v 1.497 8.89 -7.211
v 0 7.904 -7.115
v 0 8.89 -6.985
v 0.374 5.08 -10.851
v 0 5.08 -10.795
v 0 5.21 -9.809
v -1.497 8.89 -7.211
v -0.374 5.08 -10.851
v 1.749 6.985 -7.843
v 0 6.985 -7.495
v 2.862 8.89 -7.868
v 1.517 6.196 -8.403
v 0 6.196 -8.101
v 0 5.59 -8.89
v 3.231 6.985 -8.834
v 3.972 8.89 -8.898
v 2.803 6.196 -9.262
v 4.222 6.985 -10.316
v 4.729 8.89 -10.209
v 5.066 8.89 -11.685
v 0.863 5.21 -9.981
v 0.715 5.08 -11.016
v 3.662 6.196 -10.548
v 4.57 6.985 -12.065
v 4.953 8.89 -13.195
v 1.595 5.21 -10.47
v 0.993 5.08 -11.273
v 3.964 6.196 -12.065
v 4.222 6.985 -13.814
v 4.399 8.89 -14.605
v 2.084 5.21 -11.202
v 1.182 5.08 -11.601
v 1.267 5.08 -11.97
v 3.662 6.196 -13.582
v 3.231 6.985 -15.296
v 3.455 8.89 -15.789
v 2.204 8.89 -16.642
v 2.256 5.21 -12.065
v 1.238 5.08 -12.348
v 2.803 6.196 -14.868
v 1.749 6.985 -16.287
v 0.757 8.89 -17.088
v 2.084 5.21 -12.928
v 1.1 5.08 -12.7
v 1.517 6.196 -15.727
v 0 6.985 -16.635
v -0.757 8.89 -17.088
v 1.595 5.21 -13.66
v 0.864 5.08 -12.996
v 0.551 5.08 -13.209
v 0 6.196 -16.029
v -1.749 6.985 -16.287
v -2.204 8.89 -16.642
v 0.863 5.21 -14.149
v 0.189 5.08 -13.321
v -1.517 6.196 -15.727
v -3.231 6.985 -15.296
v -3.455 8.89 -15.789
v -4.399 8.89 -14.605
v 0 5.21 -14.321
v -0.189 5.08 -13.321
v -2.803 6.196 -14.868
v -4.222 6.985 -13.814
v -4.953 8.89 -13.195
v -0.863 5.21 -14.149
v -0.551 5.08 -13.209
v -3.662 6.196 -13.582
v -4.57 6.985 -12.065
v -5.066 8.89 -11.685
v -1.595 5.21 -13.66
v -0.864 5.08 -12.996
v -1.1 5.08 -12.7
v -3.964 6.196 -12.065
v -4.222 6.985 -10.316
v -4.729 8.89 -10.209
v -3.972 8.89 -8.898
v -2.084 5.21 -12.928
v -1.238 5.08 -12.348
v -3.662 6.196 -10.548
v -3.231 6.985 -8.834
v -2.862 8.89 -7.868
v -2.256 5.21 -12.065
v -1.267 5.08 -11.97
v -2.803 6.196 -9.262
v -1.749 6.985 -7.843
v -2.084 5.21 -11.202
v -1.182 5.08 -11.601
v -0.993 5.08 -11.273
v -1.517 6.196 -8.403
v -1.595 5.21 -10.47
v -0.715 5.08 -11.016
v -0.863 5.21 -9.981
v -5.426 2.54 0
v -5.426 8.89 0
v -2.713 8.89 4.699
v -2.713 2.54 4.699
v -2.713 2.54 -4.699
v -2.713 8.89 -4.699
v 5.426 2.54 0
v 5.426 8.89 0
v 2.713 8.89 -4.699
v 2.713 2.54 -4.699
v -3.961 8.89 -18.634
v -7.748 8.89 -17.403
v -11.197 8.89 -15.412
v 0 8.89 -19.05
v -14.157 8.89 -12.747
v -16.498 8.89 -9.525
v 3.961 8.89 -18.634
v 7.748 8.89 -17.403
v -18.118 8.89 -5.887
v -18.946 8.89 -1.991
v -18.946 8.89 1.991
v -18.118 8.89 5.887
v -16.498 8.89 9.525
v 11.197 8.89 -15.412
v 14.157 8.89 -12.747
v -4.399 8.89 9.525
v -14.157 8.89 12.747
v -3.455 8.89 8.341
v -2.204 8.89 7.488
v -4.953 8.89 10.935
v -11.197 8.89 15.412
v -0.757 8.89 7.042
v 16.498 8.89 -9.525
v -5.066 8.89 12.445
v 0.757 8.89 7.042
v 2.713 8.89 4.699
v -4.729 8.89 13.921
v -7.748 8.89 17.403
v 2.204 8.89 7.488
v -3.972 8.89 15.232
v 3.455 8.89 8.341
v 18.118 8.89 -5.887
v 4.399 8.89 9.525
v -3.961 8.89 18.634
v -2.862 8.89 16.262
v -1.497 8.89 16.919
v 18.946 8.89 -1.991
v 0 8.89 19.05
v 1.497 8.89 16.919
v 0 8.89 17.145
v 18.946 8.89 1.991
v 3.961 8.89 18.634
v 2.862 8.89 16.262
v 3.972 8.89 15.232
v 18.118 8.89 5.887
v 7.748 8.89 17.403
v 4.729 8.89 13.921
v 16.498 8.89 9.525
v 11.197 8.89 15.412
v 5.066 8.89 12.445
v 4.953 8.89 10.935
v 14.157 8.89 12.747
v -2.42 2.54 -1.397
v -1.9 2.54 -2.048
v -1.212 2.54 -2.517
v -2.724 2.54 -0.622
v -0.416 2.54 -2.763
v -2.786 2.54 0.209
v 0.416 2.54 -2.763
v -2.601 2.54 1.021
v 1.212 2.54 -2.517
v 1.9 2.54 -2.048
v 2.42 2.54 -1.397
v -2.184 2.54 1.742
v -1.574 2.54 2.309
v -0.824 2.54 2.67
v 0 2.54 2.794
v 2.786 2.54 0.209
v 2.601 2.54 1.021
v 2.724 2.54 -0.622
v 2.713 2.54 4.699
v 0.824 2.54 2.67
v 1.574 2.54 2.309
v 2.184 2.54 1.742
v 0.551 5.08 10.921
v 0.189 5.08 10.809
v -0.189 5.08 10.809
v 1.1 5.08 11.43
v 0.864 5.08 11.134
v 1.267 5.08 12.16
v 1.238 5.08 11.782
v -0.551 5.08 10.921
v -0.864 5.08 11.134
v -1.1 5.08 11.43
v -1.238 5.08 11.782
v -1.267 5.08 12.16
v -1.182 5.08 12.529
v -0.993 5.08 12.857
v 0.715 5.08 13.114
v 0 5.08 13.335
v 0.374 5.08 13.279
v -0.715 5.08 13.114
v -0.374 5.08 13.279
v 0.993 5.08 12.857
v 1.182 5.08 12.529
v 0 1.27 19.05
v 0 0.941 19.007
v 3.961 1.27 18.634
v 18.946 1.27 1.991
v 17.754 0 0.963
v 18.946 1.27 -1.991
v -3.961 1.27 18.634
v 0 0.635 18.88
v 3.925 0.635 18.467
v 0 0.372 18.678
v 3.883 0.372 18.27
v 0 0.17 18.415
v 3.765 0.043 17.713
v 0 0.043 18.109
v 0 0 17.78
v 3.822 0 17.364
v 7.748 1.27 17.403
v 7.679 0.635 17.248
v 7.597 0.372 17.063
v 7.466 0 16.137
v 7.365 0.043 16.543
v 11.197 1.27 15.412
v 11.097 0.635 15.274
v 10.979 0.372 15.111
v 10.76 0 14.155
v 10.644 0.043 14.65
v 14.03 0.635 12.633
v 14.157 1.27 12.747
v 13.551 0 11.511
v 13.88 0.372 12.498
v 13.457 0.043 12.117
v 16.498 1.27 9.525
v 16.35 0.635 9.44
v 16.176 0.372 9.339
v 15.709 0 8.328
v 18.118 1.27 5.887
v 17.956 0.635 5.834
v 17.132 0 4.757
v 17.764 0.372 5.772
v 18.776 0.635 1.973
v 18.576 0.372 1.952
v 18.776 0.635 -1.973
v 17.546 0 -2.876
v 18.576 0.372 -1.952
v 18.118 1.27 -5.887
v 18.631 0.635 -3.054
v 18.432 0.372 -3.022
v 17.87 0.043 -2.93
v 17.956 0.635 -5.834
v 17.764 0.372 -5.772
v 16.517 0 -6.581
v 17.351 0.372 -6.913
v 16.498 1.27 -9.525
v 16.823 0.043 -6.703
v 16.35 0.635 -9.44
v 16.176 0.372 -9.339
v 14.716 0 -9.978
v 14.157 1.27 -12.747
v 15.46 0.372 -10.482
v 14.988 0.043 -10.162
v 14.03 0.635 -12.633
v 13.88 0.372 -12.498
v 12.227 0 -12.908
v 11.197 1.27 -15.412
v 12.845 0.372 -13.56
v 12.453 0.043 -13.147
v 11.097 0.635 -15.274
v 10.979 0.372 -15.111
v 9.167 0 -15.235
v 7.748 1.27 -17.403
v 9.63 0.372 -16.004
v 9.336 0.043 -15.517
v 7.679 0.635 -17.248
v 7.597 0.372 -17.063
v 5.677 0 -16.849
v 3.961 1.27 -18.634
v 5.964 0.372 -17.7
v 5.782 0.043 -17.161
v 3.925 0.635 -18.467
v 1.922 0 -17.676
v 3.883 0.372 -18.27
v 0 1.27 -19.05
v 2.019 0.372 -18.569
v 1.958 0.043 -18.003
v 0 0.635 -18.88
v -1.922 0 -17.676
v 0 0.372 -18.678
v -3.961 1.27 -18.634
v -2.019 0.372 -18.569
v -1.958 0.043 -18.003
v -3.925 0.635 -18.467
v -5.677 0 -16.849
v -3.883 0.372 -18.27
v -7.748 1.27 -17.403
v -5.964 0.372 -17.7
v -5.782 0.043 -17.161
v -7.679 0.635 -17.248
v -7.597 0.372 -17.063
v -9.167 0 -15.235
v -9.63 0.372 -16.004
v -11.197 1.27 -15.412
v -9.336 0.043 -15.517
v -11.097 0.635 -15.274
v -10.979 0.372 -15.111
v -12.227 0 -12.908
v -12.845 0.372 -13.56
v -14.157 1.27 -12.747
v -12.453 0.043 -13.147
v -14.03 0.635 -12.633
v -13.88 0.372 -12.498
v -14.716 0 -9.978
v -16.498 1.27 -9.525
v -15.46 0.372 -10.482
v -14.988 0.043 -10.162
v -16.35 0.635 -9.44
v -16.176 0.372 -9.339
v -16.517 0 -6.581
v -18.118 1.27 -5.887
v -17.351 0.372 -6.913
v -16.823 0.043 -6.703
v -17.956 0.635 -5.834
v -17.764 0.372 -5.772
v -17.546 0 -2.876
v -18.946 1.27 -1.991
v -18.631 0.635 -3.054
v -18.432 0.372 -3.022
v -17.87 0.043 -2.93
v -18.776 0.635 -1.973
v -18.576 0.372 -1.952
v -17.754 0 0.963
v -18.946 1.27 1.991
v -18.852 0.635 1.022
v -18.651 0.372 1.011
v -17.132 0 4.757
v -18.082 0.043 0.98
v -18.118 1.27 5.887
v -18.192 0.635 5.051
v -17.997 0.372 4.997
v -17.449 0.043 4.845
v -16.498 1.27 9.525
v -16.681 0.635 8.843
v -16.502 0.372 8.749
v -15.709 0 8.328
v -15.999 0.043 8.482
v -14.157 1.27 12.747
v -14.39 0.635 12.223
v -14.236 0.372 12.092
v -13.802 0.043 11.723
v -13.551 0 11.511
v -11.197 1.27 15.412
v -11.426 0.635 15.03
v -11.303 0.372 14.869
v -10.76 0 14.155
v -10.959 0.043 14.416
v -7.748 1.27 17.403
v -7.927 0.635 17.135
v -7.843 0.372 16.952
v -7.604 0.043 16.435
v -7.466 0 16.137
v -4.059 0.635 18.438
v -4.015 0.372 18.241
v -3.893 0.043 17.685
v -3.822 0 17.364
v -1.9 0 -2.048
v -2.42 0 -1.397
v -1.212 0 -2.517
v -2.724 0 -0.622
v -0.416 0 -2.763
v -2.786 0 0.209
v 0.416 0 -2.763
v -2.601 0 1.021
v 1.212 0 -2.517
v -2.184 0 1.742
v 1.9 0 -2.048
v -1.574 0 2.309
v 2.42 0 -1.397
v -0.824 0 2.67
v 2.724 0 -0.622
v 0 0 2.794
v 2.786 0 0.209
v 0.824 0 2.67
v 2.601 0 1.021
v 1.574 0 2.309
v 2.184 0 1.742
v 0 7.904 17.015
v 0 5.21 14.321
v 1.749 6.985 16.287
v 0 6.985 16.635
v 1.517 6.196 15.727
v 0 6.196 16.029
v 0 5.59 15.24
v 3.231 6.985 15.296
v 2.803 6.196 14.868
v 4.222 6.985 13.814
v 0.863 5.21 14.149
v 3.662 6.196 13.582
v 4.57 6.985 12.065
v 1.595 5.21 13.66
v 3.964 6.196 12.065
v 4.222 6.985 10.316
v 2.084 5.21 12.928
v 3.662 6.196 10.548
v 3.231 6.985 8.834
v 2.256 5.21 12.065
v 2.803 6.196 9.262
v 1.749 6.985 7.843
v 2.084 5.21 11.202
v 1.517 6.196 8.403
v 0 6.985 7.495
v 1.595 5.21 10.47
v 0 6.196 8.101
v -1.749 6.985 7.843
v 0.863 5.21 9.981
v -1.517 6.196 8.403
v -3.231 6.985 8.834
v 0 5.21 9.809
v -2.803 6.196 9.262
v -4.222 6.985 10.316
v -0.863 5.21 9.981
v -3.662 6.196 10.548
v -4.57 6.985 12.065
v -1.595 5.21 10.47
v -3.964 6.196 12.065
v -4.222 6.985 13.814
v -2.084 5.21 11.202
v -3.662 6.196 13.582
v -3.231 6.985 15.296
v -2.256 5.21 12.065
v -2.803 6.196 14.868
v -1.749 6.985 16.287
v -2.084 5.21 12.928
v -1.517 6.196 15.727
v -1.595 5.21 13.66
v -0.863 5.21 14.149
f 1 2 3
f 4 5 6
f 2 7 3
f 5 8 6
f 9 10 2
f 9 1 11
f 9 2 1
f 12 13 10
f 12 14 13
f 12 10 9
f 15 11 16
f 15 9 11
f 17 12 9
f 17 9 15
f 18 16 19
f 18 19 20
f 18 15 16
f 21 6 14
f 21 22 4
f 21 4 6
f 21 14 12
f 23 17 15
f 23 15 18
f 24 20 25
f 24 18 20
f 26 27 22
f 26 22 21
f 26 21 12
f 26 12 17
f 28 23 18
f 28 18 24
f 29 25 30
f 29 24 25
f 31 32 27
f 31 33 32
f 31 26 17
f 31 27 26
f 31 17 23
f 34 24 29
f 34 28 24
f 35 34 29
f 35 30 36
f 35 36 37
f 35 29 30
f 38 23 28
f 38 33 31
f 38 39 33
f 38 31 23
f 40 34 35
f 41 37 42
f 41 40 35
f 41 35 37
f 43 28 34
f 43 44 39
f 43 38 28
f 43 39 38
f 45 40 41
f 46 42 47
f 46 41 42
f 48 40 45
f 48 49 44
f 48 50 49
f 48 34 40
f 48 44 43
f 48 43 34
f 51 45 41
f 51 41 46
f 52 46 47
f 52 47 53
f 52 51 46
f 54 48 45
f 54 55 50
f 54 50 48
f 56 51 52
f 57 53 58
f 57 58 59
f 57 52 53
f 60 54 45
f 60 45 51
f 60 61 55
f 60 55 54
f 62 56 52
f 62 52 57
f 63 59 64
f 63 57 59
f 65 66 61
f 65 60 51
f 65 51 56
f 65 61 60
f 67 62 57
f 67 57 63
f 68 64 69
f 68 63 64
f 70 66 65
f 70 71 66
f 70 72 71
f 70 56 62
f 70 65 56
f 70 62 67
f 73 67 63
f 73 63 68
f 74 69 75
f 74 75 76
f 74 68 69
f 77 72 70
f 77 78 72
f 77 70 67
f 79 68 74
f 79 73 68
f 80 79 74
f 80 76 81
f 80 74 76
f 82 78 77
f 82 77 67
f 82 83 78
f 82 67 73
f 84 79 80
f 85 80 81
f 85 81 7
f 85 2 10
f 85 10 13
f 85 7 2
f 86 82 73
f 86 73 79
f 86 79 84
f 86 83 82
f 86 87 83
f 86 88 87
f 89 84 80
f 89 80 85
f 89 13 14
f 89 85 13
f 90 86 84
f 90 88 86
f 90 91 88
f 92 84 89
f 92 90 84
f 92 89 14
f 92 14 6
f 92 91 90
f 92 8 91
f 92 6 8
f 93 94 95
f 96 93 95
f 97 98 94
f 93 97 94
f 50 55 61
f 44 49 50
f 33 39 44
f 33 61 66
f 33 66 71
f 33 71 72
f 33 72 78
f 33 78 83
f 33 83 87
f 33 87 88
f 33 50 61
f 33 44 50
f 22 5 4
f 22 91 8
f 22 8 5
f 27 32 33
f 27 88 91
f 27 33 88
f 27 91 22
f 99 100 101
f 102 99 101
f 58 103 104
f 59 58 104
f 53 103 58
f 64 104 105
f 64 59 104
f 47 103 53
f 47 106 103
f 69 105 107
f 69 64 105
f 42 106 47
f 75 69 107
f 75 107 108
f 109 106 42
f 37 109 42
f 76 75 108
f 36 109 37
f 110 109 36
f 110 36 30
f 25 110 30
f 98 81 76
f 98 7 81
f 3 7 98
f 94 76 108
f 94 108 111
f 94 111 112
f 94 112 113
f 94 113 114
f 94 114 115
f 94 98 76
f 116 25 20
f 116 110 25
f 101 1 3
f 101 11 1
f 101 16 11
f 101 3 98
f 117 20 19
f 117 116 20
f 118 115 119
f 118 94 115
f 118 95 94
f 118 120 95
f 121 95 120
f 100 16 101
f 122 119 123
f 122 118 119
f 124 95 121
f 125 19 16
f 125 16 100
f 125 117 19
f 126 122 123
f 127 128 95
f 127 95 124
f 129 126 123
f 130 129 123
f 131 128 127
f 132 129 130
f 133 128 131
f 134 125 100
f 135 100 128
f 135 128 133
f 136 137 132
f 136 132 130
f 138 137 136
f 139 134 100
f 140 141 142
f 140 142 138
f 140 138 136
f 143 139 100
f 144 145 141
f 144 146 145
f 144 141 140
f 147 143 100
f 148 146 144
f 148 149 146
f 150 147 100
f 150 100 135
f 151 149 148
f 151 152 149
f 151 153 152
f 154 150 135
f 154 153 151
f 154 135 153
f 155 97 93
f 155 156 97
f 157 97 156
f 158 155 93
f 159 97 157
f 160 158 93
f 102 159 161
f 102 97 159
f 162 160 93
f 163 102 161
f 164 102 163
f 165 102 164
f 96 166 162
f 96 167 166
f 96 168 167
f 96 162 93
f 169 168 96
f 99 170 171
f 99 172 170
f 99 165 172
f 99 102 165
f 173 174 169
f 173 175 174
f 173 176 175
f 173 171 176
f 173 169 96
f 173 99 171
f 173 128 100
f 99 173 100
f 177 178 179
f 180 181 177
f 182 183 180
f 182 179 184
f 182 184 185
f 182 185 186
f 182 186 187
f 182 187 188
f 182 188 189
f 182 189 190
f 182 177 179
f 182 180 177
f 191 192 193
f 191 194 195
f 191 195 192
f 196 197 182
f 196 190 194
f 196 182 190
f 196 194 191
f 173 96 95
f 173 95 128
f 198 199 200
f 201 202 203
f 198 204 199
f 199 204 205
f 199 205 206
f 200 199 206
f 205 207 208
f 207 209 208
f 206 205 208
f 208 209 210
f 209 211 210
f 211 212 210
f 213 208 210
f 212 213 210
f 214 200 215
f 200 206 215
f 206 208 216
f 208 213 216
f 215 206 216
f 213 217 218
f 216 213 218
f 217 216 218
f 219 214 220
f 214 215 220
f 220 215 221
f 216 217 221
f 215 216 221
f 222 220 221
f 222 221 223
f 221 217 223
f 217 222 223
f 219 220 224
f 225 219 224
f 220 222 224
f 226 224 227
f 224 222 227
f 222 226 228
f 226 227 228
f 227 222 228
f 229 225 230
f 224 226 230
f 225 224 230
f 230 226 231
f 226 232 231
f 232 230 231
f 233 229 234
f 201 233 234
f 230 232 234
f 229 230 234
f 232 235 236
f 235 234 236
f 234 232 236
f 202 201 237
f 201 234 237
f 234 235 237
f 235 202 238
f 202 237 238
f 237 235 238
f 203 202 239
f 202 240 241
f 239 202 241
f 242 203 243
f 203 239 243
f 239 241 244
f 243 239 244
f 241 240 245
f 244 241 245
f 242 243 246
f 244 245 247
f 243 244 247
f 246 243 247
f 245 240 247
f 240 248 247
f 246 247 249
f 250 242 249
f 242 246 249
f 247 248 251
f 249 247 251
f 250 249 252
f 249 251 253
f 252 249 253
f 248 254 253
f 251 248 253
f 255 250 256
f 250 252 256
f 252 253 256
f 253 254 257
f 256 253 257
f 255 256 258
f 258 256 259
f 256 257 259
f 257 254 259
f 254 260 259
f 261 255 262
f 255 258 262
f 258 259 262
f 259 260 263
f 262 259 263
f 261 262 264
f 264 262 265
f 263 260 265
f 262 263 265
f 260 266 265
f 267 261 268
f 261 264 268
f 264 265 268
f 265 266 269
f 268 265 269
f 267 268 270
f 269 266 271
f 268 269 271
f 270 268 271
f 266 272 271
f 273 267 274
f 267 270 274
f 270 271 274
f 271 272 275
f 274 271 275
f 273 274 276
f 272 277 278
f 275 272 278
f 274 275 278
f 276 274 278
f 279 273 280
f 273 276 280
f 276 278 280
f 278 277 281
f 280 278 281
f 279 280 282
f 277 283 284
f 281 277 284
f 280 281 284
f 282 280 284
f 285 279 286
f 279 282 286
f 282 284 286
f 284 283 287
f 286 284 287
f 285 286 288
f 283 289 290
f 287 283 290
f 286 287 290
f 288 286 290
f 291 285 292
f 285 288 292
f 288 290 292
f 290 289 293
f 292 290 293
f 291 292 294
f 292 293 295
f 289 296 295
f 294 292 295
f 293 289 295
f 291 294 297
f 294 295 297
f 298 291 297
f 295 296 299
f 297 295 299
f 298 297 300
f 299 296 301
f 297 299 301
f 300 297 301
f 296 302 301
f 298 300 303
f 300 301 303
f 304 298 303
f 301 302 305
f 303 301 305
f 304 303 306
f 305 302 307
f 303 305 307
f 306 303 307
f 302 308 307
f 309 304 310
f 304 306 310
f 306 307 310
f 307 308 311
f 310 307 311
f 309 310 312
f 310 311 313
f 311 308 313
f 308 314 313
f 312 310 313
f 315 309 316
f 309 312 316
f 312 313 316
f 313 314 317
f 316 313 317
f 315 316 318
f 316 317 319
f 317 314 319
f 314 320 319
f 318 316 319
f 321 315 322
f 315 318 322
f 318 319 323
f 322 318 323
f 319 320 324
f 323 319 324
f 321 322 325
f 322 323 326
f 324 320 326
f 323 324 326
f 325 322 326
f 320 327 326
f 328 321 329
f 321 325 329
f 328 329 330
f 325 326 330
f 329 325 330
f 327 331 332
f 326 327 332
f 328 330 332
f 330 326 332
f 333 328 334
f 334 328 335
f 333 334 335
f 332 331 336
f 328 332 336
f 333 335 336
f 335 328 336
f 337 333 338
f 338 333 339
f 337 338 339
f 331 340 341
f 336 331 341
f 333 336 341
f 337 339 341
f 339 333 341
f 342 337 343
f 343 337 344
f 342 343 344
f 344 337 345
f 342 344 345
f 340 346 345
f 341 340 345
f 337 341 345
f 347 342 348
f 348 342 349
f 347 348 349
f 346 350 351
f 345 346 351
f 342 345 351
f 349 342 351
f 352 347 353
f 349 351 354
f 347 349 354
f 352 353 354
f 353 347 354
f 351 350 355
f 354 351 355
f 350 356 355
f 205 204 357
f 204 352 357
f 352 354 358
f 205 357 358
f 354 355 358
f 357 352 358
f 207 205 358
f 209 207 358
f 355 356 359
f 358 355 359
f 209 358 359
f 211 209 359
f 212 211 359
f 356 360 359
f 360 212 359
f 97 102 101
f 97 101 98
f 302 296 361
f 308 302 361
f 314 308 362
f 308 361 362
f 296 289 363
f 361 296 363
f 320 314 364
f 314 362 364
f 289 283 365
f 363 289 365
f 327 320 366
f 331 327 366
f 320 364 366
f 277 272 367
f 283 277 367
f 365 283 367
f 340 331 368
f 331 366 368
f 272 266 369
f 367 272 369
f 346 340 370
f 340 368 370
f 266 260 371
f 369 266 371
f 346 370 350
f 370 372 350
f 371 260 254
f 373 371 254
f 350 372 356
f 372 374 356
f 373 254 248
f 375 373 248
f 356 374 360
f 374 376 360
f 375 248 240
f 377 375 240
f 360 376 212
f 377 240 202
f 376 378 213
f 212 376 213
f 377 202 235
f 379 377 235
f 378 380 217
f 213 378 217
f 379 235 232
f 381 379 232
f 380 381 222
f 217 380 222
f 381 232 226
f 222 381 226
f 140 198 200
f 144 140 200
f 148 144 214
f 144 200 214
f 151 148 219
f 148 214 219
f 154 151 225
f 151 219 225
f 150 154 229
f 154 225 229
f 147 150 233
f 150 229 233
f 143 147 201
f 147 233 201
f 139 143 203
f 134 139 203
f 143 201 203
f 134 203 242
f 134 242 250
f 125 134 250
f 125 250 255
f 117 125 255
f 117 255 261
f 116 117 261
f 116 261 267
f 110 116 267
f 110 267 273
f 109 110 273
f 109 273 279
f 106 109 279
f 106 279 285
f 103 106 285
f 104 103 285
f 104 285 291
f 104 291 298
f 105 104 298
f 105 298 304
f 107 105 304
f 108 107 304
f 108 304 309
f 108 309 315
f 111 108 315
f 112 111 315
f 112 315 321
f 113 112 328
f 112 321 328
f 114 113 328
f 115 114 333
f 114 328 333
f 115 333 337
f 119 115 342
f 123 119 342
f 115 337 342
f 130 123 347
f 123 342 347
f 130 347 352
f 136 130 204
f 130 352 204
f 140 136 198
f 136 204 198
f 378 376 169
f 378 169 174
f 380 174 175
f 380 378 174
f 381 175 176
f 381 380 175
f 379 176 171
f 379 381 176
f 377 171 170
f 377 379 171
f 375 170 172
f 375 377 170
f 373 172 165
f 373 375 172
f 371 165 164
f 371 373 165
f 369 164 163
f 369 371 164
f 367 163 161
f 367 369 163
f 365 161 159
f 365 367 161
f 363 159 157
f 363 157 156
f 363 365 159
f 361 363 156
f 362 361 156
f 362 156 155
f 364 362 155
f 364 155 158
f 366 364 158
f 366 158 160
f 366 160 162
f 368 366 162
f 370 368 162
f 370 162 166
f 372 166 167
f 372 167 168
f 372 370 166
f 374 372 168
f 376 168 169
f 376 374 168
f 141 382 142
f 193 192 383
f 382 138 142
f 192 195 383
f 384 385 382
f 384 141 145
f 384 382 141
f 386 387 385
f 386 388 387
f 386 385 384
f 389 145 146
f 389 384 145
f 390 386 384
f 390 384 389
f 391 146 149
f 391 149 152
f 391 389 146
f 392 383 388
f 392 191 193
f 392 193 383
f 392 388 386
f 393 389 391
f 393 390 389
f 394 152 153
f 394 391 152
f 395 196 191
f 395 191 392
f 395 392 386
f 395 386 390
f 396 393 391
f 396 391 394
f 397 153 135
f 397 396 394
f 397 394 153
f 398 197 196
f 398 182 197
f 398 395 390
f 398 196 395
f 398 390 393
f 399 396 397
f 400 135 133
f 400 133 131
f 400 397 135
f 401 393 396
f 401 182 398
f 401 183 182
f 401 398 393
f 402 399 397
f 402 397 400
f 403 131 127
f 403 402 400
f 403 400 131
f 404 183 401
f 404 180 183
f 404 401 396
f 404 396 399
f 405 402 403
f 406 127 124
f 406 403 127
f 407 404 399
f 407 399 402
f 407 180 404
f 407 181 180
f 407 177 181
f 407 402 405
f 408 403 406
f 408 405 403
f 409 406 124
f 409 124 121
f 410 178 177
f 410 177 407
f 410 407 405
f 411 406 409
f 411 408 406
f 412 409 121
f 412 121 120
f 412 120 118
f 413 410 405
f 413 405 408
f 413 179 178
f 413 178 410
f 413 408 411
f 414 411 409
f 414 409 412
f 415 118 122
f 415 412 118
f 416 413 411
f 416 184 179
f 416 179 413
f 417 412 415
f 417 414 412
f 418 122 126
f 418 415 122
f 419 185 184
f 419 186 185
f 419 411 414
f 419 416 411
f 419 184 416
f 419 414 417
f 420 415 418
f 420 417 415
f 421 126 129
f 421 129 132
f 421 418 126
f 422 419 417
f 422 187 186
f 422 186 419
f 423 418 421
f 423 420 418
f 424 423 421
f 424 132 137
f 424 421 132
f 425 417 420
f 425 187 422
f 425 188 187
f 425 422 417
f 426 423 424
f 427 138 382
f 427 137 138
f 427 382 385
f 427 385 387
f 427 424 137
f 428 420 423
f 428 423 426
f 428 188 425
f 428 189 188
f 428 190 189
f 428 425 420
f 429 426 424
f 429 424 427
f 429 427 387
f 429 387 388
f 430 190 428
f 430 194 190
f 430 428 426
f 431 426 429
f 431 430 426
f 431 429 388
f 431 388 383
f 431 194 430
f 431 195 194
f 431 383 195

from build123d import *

# Parameters (mm, degrees)
SKETCH1_R           = 19.05
SKETCH1_R_2         = 2.794
BOSS_EXTRUDE1_DEPTH = 2.54
SKETCH2_R           = 19.05
BOSS_EXTRUDE2_DEPTH = 6.35
SKETCH3_R           = 5.08
CUT_EXTRUDE1_DEPTH  = 3.81
FILLET1_R           = 3.81
FILLET2_R           = 1.27


with BuildPart() as part:
    # Sketch1 → Boss-Extrude1 (new body)
    with BuildSketch(Plane(origin=(0, 0, 0), x_dir=(1, 0, 0), z_dir=(0, 1, 0))):
        with Locations(Location((0, 0, 0), (0, 0, 270))):
            Circle(SKETCH1_R)
        with Locations(Location((0, 0, 0), (0, 0, 270))):
            Circle(SKETCH1_R_2, mode=Mode.SUBTRACT)
    extrude(amount=BOSS_EXTRUDE1_DEPTH)

    # Sketch2 → Boss-Extrude2 (add)
    with BuildSketch(Plane(origin=(0, 2.54, 0), x_dir=(1, 0, 0), z_dir=(0, 1, 0))):
        with Locations(Location((0, 0, 0), (0, 0, 270))):
            Circle(SKETCH2_R)
        Polygon((5.42593783, 0), (2.712968915, 4.699), (-2.712968915, 4.699), (-5.42593783, 0), (-2.712968915, -4.699), (2.712968915, -4.699), align=None, mode=Mode.SUBTRACT)
    extrude(amount=BOSS_EXTRUDE2_DEPTH)

    # Sketch3 → Cut-Extrude1 (cut)
    with BuildSketch(Plane(origin=(0, 8.89, 0), x_dir=(1, 0, 0), z_dir=(0, 1, 0))):
        with Locations(Location((0, 12.065, 0), (0, 0, 270))):
            Circle(SKETCH3_R)
        with Locations(Location((0, -12.065, 0), (0, 0, 270))):
            Circle(SKETCH3_R)
    extrude(amount=-CUT_EXTRUDE1_DEPTH, mode=Mode.SUBTRACT)

    # Fillet1
    fillet1_edges = [part.edges().sort_by_distance(p)[0] for p in [
        (0, 5.08, -17.145),
        (0, 5.08, 6.985),
    ]]
    fillet(fillet1_edges, radius=FILLET1_R - 0.0001)  # a hair under: the kernel refuses the full size

    # Fillet2
    fillet2_edges = [part.edges().sort_by_distance(p)[0] for p in [
        (0, 0, -19.05),
    ]]
    fillet(fillet2_edges, radius=FILLET2_R)


solid = part.part
